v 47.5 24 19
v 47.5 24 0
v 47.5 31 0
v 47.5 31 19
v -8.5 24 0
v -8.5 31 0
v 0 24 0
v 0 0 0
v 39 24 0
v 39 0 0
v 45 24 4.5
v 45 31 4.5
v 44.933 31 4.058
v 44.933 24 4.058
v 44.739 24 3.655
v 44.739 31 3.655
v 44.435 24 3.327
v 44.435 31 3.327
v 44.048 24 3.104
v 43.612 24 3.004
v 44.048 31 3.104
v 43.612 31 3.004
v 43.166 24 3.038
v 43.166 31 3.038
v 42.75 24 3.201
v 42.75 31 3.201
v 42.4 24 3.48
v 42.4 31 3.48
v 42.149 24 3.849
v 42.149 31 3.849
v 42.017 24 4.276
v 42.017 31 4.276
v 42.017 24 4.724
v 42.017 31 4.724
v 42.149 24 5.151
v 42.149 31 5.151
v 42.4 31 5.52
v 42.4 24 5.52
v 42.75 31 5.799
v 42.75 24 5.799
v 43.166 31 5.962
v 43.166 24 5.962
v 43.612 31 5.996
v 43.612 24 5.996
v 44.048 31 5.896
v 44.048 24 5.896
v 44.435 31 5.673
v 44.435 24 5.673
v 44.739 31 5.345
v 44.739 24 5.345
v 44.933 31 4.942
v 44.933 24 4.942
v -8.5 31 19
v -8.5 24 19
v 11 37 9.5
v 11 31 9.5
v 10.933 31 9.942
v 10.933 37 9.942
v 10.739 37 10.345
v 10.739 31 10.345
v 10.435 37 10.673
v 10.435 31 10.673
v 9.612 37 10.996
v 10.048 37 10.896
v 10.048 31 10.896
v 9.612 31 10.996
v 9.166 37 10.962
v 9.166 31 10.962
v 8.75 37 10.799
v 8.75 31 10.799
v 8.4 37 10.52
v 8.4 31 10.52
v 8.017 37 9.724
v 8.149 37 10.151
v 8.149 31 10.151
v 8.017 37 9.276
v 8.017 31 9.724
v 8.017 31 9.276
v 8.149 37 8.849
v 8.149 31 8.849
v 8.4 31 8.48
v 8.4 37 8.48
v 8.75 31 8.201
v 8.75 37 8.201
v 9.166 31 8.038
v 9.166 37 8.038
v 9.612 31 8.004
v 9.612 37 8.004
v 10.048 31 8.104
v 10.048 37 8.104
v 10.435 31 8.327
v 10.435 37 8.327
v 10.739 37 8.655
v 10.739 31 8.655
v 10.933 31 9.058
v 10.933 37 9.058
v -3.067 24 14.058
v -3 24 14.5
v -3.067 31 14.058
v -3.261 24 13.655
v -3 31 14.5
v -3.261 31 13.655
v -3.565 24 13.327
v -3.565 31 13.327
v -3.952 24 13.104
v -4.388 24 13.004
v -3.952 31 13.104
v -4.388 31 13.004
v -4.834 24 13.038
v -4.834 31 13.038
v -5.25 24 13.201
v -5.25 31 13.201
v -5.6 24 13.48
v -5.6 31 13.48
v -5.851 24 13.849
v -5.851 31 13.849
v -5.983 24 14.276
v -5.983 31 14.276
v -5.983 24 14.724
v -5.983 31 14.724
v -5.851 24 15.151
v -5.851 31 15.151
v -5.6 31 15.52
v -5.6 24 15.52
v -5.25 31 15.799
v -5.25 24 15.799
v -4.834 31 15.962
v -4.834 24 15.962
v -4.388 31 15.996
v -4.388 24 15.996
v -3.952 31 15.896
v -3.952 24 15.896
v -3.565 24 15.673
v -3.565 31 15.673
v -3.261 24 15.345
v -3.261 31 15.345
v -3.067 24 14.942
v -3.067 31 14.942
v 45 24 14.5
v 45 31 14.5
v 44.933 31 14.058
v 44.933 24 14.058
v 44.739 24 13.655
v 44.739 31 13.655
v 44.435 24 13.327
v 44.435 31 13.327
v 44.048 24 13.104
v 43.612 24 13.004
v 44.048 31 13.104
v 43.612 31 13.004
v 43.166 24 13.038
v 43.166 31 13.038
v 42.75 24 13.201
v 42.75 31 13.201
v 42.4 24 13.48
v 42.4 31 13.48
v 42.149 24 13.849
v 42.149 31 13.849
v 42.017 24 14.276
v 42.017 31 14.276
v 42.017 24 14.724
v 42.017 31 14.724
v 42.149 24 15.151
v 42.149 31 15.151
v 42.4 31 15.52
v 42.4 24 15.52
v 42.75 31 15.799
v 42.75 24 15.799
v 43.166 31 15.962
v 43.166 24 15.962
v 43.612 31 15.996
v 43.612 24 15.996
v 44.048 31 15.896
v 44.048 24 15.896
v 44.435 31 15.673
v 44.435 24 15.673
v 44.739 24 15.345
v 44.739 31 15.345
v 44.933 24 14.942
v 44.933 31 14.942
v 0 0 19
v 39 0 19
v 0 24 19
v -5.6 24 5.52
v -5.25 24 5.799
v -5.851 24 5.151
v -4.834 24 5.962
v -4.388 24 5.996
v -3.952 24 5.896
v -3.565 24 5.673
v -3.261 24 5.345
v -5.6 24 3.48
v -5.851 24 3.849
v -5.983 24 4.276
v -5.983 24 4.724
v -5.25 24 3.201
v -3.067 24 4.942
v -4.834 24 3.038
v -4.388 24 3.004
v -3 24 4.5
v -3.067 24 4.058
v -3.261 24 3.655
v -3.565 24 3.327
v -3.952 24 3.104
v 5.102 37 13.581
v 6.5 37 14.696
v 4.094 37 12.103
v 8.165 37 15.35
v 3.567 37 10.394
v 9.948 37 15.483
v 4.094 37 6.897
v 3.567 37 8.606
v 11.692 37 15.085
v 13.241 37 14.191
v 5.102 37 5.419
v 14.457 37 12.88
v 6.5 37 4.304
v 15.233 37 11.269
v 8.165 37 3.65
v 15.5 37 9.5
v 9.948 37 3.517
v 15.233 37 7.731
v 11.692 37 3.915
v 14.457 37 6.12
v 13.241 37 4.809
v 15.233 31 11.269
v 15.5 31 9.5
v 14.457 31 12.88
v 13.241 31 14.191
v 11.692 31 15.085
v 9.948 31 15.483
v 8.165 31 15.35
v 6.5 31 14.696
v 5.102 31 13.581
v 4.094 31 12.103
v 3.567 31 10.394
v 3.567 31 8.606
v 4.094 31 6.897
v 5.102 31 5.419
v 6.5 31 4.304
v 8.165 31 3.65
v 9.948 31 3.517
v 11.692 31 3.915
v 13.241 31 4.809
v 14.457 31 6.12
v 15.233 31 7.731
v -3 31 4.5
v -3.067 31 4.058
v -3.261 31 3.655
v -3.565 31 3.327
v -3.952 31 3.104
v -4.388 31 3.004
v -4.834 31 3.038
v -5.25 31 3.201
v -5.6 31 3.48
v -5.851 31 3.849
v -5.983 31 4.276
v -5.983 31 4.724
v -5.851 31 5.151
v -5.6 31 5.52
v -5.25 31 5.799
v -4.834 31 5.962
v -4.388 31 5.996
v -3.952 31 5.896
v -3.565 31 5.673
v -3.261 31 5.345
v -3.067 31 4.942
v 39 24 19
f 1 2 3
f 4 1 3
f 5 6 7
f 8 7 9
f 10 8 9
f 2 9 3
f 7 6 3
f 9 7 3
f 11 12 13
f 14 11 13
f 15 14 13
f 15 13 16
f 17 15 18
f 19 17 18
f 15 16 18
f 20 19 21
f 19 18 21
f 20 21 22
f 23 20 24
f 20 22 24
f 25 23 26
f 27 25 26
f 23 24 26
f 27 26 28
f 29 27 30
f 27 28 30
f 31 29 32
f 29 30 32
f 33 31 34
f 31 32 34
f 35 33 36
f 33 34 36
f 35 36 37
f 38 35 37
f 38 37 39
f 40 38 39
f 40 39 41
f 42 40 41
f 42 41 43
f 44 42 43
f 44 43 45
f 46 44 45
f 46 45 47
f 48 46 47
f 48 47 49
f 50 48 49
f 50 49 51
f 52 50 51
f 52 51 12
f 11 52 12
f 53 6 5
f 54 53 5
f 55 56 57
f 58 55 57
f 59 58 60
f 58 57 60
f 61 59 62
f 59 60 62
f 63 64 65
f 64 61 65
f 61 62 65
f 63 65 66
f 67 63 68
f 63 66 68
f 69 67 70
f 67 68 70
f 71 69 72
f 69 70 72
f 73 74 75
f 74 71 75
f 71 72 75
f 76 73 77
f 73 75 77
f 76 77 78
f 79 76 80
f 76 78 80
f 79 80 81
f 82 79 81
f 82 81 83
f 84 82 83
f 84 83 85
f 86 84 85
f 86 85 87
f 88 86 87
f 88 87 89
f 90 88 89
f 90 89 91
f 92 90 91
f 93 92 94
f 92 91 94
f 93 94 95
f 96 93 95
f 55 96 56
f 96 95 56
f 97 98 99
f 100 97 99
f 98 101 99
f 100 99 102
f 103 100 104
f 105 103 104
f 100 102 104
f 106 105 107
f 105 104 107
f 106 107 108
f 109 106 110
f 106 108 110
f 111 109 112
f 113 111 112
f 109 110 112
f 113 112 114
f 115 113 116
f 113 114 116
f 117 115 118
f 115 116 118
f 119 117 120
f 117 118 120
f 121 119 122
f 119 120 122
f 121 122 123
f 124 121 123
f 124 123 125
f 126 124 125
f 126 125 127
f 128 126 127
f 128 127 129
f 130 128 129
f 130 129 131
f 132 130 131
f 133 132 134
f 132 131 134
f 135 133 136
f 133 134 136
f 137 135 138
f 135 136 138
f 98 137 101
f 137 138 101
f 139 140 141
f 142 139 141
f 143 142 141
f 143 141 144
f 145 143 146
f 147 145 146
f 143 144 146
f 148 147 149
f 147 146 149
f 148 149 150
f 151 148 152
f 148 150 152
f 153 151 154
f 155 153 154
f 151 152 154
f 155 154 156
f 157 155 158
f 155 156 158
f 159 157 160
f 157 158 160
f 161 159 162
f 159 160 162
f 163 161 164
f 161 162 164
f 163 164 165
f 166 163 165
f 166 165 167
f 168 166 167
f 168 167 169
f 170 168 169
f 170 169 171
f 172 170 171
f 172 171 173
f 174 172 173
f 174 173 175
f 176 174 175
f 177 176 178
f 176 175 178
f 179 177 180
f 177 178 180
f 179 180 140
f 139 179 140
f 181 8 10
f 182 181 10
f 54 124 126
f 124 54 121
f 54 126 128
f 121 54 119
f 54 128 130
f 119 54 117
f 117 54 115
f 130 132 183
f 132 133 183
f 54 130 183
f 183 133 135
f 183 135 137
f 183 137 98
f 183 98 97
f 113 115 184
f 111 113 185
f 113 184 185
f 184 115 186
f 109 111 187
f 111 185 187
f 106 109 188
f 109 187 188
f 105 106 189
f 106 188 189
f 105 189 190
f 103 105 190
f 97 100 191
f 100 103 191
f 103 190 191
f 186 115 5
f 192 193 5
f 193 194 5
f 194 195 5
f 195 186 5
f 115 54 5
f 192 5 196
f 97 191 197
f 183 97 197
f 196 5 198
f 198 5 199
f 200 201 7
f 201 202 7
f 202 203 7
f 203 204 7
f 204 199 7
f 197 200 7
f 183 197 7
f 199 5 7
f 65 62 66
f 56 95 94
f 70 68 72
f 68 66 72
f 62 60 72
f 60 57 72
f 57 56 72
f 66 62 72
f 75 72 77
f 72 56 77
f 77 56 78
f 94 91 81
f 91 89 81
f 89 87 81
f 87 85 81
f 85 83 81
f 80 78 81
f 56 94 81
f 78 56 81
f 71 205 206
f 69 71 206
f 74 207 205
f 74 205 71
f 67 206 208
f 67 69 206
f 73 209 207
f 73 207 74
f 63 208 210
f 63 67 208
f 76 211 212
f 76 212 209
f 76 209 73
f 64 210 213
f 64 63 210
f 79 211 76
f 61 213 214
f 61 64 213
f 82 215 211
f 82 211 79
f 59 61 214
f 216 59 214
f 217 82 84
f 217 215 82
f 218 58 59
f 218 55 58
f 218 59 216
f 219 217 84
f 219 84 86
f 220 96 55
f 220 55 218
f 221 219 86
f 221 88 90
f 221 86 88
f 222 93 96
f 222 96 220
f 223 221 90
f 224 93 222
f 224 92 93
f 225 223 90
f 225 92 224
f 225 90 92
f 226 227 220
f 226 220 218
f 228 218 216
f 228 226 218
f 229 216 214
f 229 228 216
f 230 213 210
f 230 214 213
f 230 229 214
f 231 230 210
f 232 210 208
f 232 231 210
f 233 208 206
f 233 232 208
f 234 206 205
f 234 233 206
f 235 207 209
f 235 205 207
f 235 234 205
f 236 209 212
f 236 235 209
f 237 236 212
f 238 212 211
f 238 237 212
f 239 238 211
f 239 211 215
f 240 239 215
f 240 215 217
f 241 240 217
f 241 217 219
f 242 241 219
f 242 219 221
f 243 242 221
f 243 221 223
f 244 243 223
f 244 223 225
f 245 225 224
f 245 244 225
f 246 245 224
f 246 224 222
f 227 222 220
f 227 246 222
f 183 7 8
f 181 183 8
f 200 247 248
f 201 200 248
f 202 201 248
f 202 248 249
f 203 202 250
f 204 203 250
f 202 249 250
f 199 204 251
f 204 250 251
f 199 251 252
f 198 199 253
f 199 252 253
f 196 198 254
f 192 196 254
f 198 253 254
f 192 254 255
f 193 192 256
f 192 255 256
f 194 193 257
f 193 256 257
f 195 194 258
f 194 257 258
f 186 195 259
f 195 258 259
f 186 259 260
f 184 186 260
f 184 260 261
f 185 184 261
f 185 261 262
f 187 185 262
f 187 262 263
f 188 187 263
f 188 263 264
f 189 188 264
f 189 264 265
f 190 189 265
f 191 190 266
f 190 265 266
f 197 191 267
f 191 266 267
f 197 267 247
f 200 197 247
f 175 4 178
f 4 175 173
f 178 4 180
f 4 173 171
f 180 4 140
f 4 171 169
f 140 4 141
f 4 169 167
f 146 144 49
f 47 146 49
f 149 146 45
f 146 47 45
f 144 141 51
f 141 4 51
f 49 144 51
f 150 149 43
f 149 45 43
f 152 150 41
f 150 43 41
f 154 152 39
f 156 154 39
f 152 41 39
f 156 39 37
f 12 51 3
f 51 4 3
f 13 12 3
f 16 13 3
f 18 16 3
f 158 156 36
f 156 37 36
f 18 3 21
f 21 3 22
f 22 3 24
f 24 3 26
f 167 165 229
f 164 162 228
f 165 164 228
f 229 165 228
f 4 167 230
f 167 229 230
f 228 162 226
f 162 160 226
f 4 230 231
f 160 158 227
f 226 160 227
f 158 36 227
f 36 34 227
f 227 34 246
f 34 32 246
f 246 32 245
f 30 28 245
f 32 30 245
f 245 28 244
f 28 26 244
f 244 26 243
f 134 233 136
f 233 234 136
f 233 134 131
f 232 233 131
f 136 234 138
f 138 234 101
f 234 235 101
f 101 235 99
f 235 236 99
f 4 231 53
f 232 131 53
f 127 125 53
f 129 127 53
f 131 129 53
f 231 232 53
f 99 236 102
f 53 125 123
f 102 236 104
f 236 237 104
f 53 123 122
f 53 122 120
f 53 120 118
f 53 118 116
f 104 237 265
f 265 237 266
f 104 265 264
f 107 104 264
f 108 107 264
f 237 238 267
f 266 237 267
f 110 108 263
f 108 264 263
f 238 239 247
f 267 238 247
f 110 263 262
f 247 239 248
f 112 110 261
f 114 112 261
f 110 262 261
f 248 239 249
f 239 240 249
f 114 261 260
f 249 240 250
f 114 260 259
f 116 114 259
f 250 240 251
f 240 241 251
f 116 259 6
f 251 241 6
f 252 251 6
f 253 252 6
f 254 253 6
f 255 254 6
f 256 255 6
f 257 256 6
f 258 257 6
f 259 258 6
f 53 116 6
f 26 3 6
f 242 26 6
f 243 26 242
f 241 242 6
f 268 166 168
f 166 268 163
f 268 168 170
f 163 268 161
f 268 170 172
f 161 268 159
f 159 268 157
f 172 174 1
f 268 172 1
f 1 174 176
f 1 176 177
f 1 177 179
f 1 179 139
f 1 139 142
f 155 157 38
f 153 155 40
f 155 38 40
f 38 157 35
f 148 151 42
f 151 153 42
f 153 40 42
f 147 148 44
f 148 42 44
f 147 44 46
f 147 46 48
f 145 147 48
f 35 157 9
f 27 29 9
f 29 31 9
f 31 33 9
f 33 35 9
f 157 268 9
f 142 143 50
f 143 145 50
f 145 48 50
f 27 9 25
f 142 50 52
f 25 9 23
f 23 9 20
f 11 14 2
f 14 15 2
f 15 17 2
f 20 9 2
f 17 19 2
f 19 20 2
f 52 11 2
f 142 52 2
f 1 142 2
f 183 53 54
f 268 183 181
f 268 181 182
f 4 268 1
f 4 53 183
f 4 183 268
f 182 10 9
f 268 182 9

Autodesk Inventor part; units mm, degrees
ref_plane "YZ Plane" through (0, 0, 0) normal (1, 0, 0) x (0, 1, 0)
ref_plane "XZ Plane" through (0, 0, 0) normal (0, 1, 0) x (-1, 0, 0)
ref_plane "XY Plane" through (0, 0, 0) normal (0, 0, 1) x (1, 0, 0)
sketch "Sketch1" plane through (0, 0, 0) normal (0, 0, 1) x (1, 0, 0)
  line L0 (0, 0) -> (39, 0)
  line L1 (39, 0) -> (39, 24)
  line L2 (39, 24) -> (0, 24)
  line L3 (0, 24) -> (0, 0)
  line L4 (-8.5, 24) -> (47.5, 24)
  line L5 (47.5, 24) -> (47.5, 31)
  line L6 (47.5, 31) -> (-8.5, 31)
  line L7 (-8.5, 31) -> (-8.5, 24)
  point P0 (19.5, 24)
  dimension "d0" = 39
  dimension "d1" = 24
  dimension "d2" = 56
  dimension "d3" = 7
extrude "Extrusion1" add sketch "Sketch1" along normal blind 19
sketch "Sketch2" plane through (-8.5, 31, 0) normal (0, 1, 0) x (1, 0, 0)
  circle A0 centre (18, -9.5) radius 6
  line L0 (0, 0) -> (0, -19) projected
  circle A1 centre (18, -9.5) radius 1.5
  point P0 (8.5, 0)
  point P1 (0, -9.5)
  dimension "d6" = 12
  dimension "d7" = 18
  dimension "d8" = 3
extrude "Extrusion2" add sketch "Sketch2" along normal blind 6
sketch "Sketch3" plane through (-8.5, 31, 0) normal (0, 1, 0) x (1, 0, 0)
  line L0 (4, -4.5) -> (52, -4.5) construction
  line L1 (52, -4.5) -> (52, -14.5) construction
  line L2 (52, -14.5) -> (4, -14.5) construction
  line L3 (4, -14.5) -> (4, -4.5) construction
  circle A0 centre (4, -4.5) radius 1.5
  circle A1 centre (4, -14.5) radius 1.5
  circle A2 centre (52, -14.5) radius 1.5
  circle A3 centre (52, -4.5) radius 1.5
  line L4 (0, 0) -> (0, -19) projected
  line L5 (56, 0) -> (56, -19) projected
  point P0 (8.5, 0)
  dimension "d11" = 3
  dimension "d12" = 3
  dimension "d13" = 3
  dimension "d14" = 3
  dimension "d15" = 4
  dimension "d16" = 4
  dimension "d17" = 4.5
  dimension "d18" = 4.5
extrude "Extrusion3" cut sketch "Sketch3" against normal blind 10
properties part number "servo"
